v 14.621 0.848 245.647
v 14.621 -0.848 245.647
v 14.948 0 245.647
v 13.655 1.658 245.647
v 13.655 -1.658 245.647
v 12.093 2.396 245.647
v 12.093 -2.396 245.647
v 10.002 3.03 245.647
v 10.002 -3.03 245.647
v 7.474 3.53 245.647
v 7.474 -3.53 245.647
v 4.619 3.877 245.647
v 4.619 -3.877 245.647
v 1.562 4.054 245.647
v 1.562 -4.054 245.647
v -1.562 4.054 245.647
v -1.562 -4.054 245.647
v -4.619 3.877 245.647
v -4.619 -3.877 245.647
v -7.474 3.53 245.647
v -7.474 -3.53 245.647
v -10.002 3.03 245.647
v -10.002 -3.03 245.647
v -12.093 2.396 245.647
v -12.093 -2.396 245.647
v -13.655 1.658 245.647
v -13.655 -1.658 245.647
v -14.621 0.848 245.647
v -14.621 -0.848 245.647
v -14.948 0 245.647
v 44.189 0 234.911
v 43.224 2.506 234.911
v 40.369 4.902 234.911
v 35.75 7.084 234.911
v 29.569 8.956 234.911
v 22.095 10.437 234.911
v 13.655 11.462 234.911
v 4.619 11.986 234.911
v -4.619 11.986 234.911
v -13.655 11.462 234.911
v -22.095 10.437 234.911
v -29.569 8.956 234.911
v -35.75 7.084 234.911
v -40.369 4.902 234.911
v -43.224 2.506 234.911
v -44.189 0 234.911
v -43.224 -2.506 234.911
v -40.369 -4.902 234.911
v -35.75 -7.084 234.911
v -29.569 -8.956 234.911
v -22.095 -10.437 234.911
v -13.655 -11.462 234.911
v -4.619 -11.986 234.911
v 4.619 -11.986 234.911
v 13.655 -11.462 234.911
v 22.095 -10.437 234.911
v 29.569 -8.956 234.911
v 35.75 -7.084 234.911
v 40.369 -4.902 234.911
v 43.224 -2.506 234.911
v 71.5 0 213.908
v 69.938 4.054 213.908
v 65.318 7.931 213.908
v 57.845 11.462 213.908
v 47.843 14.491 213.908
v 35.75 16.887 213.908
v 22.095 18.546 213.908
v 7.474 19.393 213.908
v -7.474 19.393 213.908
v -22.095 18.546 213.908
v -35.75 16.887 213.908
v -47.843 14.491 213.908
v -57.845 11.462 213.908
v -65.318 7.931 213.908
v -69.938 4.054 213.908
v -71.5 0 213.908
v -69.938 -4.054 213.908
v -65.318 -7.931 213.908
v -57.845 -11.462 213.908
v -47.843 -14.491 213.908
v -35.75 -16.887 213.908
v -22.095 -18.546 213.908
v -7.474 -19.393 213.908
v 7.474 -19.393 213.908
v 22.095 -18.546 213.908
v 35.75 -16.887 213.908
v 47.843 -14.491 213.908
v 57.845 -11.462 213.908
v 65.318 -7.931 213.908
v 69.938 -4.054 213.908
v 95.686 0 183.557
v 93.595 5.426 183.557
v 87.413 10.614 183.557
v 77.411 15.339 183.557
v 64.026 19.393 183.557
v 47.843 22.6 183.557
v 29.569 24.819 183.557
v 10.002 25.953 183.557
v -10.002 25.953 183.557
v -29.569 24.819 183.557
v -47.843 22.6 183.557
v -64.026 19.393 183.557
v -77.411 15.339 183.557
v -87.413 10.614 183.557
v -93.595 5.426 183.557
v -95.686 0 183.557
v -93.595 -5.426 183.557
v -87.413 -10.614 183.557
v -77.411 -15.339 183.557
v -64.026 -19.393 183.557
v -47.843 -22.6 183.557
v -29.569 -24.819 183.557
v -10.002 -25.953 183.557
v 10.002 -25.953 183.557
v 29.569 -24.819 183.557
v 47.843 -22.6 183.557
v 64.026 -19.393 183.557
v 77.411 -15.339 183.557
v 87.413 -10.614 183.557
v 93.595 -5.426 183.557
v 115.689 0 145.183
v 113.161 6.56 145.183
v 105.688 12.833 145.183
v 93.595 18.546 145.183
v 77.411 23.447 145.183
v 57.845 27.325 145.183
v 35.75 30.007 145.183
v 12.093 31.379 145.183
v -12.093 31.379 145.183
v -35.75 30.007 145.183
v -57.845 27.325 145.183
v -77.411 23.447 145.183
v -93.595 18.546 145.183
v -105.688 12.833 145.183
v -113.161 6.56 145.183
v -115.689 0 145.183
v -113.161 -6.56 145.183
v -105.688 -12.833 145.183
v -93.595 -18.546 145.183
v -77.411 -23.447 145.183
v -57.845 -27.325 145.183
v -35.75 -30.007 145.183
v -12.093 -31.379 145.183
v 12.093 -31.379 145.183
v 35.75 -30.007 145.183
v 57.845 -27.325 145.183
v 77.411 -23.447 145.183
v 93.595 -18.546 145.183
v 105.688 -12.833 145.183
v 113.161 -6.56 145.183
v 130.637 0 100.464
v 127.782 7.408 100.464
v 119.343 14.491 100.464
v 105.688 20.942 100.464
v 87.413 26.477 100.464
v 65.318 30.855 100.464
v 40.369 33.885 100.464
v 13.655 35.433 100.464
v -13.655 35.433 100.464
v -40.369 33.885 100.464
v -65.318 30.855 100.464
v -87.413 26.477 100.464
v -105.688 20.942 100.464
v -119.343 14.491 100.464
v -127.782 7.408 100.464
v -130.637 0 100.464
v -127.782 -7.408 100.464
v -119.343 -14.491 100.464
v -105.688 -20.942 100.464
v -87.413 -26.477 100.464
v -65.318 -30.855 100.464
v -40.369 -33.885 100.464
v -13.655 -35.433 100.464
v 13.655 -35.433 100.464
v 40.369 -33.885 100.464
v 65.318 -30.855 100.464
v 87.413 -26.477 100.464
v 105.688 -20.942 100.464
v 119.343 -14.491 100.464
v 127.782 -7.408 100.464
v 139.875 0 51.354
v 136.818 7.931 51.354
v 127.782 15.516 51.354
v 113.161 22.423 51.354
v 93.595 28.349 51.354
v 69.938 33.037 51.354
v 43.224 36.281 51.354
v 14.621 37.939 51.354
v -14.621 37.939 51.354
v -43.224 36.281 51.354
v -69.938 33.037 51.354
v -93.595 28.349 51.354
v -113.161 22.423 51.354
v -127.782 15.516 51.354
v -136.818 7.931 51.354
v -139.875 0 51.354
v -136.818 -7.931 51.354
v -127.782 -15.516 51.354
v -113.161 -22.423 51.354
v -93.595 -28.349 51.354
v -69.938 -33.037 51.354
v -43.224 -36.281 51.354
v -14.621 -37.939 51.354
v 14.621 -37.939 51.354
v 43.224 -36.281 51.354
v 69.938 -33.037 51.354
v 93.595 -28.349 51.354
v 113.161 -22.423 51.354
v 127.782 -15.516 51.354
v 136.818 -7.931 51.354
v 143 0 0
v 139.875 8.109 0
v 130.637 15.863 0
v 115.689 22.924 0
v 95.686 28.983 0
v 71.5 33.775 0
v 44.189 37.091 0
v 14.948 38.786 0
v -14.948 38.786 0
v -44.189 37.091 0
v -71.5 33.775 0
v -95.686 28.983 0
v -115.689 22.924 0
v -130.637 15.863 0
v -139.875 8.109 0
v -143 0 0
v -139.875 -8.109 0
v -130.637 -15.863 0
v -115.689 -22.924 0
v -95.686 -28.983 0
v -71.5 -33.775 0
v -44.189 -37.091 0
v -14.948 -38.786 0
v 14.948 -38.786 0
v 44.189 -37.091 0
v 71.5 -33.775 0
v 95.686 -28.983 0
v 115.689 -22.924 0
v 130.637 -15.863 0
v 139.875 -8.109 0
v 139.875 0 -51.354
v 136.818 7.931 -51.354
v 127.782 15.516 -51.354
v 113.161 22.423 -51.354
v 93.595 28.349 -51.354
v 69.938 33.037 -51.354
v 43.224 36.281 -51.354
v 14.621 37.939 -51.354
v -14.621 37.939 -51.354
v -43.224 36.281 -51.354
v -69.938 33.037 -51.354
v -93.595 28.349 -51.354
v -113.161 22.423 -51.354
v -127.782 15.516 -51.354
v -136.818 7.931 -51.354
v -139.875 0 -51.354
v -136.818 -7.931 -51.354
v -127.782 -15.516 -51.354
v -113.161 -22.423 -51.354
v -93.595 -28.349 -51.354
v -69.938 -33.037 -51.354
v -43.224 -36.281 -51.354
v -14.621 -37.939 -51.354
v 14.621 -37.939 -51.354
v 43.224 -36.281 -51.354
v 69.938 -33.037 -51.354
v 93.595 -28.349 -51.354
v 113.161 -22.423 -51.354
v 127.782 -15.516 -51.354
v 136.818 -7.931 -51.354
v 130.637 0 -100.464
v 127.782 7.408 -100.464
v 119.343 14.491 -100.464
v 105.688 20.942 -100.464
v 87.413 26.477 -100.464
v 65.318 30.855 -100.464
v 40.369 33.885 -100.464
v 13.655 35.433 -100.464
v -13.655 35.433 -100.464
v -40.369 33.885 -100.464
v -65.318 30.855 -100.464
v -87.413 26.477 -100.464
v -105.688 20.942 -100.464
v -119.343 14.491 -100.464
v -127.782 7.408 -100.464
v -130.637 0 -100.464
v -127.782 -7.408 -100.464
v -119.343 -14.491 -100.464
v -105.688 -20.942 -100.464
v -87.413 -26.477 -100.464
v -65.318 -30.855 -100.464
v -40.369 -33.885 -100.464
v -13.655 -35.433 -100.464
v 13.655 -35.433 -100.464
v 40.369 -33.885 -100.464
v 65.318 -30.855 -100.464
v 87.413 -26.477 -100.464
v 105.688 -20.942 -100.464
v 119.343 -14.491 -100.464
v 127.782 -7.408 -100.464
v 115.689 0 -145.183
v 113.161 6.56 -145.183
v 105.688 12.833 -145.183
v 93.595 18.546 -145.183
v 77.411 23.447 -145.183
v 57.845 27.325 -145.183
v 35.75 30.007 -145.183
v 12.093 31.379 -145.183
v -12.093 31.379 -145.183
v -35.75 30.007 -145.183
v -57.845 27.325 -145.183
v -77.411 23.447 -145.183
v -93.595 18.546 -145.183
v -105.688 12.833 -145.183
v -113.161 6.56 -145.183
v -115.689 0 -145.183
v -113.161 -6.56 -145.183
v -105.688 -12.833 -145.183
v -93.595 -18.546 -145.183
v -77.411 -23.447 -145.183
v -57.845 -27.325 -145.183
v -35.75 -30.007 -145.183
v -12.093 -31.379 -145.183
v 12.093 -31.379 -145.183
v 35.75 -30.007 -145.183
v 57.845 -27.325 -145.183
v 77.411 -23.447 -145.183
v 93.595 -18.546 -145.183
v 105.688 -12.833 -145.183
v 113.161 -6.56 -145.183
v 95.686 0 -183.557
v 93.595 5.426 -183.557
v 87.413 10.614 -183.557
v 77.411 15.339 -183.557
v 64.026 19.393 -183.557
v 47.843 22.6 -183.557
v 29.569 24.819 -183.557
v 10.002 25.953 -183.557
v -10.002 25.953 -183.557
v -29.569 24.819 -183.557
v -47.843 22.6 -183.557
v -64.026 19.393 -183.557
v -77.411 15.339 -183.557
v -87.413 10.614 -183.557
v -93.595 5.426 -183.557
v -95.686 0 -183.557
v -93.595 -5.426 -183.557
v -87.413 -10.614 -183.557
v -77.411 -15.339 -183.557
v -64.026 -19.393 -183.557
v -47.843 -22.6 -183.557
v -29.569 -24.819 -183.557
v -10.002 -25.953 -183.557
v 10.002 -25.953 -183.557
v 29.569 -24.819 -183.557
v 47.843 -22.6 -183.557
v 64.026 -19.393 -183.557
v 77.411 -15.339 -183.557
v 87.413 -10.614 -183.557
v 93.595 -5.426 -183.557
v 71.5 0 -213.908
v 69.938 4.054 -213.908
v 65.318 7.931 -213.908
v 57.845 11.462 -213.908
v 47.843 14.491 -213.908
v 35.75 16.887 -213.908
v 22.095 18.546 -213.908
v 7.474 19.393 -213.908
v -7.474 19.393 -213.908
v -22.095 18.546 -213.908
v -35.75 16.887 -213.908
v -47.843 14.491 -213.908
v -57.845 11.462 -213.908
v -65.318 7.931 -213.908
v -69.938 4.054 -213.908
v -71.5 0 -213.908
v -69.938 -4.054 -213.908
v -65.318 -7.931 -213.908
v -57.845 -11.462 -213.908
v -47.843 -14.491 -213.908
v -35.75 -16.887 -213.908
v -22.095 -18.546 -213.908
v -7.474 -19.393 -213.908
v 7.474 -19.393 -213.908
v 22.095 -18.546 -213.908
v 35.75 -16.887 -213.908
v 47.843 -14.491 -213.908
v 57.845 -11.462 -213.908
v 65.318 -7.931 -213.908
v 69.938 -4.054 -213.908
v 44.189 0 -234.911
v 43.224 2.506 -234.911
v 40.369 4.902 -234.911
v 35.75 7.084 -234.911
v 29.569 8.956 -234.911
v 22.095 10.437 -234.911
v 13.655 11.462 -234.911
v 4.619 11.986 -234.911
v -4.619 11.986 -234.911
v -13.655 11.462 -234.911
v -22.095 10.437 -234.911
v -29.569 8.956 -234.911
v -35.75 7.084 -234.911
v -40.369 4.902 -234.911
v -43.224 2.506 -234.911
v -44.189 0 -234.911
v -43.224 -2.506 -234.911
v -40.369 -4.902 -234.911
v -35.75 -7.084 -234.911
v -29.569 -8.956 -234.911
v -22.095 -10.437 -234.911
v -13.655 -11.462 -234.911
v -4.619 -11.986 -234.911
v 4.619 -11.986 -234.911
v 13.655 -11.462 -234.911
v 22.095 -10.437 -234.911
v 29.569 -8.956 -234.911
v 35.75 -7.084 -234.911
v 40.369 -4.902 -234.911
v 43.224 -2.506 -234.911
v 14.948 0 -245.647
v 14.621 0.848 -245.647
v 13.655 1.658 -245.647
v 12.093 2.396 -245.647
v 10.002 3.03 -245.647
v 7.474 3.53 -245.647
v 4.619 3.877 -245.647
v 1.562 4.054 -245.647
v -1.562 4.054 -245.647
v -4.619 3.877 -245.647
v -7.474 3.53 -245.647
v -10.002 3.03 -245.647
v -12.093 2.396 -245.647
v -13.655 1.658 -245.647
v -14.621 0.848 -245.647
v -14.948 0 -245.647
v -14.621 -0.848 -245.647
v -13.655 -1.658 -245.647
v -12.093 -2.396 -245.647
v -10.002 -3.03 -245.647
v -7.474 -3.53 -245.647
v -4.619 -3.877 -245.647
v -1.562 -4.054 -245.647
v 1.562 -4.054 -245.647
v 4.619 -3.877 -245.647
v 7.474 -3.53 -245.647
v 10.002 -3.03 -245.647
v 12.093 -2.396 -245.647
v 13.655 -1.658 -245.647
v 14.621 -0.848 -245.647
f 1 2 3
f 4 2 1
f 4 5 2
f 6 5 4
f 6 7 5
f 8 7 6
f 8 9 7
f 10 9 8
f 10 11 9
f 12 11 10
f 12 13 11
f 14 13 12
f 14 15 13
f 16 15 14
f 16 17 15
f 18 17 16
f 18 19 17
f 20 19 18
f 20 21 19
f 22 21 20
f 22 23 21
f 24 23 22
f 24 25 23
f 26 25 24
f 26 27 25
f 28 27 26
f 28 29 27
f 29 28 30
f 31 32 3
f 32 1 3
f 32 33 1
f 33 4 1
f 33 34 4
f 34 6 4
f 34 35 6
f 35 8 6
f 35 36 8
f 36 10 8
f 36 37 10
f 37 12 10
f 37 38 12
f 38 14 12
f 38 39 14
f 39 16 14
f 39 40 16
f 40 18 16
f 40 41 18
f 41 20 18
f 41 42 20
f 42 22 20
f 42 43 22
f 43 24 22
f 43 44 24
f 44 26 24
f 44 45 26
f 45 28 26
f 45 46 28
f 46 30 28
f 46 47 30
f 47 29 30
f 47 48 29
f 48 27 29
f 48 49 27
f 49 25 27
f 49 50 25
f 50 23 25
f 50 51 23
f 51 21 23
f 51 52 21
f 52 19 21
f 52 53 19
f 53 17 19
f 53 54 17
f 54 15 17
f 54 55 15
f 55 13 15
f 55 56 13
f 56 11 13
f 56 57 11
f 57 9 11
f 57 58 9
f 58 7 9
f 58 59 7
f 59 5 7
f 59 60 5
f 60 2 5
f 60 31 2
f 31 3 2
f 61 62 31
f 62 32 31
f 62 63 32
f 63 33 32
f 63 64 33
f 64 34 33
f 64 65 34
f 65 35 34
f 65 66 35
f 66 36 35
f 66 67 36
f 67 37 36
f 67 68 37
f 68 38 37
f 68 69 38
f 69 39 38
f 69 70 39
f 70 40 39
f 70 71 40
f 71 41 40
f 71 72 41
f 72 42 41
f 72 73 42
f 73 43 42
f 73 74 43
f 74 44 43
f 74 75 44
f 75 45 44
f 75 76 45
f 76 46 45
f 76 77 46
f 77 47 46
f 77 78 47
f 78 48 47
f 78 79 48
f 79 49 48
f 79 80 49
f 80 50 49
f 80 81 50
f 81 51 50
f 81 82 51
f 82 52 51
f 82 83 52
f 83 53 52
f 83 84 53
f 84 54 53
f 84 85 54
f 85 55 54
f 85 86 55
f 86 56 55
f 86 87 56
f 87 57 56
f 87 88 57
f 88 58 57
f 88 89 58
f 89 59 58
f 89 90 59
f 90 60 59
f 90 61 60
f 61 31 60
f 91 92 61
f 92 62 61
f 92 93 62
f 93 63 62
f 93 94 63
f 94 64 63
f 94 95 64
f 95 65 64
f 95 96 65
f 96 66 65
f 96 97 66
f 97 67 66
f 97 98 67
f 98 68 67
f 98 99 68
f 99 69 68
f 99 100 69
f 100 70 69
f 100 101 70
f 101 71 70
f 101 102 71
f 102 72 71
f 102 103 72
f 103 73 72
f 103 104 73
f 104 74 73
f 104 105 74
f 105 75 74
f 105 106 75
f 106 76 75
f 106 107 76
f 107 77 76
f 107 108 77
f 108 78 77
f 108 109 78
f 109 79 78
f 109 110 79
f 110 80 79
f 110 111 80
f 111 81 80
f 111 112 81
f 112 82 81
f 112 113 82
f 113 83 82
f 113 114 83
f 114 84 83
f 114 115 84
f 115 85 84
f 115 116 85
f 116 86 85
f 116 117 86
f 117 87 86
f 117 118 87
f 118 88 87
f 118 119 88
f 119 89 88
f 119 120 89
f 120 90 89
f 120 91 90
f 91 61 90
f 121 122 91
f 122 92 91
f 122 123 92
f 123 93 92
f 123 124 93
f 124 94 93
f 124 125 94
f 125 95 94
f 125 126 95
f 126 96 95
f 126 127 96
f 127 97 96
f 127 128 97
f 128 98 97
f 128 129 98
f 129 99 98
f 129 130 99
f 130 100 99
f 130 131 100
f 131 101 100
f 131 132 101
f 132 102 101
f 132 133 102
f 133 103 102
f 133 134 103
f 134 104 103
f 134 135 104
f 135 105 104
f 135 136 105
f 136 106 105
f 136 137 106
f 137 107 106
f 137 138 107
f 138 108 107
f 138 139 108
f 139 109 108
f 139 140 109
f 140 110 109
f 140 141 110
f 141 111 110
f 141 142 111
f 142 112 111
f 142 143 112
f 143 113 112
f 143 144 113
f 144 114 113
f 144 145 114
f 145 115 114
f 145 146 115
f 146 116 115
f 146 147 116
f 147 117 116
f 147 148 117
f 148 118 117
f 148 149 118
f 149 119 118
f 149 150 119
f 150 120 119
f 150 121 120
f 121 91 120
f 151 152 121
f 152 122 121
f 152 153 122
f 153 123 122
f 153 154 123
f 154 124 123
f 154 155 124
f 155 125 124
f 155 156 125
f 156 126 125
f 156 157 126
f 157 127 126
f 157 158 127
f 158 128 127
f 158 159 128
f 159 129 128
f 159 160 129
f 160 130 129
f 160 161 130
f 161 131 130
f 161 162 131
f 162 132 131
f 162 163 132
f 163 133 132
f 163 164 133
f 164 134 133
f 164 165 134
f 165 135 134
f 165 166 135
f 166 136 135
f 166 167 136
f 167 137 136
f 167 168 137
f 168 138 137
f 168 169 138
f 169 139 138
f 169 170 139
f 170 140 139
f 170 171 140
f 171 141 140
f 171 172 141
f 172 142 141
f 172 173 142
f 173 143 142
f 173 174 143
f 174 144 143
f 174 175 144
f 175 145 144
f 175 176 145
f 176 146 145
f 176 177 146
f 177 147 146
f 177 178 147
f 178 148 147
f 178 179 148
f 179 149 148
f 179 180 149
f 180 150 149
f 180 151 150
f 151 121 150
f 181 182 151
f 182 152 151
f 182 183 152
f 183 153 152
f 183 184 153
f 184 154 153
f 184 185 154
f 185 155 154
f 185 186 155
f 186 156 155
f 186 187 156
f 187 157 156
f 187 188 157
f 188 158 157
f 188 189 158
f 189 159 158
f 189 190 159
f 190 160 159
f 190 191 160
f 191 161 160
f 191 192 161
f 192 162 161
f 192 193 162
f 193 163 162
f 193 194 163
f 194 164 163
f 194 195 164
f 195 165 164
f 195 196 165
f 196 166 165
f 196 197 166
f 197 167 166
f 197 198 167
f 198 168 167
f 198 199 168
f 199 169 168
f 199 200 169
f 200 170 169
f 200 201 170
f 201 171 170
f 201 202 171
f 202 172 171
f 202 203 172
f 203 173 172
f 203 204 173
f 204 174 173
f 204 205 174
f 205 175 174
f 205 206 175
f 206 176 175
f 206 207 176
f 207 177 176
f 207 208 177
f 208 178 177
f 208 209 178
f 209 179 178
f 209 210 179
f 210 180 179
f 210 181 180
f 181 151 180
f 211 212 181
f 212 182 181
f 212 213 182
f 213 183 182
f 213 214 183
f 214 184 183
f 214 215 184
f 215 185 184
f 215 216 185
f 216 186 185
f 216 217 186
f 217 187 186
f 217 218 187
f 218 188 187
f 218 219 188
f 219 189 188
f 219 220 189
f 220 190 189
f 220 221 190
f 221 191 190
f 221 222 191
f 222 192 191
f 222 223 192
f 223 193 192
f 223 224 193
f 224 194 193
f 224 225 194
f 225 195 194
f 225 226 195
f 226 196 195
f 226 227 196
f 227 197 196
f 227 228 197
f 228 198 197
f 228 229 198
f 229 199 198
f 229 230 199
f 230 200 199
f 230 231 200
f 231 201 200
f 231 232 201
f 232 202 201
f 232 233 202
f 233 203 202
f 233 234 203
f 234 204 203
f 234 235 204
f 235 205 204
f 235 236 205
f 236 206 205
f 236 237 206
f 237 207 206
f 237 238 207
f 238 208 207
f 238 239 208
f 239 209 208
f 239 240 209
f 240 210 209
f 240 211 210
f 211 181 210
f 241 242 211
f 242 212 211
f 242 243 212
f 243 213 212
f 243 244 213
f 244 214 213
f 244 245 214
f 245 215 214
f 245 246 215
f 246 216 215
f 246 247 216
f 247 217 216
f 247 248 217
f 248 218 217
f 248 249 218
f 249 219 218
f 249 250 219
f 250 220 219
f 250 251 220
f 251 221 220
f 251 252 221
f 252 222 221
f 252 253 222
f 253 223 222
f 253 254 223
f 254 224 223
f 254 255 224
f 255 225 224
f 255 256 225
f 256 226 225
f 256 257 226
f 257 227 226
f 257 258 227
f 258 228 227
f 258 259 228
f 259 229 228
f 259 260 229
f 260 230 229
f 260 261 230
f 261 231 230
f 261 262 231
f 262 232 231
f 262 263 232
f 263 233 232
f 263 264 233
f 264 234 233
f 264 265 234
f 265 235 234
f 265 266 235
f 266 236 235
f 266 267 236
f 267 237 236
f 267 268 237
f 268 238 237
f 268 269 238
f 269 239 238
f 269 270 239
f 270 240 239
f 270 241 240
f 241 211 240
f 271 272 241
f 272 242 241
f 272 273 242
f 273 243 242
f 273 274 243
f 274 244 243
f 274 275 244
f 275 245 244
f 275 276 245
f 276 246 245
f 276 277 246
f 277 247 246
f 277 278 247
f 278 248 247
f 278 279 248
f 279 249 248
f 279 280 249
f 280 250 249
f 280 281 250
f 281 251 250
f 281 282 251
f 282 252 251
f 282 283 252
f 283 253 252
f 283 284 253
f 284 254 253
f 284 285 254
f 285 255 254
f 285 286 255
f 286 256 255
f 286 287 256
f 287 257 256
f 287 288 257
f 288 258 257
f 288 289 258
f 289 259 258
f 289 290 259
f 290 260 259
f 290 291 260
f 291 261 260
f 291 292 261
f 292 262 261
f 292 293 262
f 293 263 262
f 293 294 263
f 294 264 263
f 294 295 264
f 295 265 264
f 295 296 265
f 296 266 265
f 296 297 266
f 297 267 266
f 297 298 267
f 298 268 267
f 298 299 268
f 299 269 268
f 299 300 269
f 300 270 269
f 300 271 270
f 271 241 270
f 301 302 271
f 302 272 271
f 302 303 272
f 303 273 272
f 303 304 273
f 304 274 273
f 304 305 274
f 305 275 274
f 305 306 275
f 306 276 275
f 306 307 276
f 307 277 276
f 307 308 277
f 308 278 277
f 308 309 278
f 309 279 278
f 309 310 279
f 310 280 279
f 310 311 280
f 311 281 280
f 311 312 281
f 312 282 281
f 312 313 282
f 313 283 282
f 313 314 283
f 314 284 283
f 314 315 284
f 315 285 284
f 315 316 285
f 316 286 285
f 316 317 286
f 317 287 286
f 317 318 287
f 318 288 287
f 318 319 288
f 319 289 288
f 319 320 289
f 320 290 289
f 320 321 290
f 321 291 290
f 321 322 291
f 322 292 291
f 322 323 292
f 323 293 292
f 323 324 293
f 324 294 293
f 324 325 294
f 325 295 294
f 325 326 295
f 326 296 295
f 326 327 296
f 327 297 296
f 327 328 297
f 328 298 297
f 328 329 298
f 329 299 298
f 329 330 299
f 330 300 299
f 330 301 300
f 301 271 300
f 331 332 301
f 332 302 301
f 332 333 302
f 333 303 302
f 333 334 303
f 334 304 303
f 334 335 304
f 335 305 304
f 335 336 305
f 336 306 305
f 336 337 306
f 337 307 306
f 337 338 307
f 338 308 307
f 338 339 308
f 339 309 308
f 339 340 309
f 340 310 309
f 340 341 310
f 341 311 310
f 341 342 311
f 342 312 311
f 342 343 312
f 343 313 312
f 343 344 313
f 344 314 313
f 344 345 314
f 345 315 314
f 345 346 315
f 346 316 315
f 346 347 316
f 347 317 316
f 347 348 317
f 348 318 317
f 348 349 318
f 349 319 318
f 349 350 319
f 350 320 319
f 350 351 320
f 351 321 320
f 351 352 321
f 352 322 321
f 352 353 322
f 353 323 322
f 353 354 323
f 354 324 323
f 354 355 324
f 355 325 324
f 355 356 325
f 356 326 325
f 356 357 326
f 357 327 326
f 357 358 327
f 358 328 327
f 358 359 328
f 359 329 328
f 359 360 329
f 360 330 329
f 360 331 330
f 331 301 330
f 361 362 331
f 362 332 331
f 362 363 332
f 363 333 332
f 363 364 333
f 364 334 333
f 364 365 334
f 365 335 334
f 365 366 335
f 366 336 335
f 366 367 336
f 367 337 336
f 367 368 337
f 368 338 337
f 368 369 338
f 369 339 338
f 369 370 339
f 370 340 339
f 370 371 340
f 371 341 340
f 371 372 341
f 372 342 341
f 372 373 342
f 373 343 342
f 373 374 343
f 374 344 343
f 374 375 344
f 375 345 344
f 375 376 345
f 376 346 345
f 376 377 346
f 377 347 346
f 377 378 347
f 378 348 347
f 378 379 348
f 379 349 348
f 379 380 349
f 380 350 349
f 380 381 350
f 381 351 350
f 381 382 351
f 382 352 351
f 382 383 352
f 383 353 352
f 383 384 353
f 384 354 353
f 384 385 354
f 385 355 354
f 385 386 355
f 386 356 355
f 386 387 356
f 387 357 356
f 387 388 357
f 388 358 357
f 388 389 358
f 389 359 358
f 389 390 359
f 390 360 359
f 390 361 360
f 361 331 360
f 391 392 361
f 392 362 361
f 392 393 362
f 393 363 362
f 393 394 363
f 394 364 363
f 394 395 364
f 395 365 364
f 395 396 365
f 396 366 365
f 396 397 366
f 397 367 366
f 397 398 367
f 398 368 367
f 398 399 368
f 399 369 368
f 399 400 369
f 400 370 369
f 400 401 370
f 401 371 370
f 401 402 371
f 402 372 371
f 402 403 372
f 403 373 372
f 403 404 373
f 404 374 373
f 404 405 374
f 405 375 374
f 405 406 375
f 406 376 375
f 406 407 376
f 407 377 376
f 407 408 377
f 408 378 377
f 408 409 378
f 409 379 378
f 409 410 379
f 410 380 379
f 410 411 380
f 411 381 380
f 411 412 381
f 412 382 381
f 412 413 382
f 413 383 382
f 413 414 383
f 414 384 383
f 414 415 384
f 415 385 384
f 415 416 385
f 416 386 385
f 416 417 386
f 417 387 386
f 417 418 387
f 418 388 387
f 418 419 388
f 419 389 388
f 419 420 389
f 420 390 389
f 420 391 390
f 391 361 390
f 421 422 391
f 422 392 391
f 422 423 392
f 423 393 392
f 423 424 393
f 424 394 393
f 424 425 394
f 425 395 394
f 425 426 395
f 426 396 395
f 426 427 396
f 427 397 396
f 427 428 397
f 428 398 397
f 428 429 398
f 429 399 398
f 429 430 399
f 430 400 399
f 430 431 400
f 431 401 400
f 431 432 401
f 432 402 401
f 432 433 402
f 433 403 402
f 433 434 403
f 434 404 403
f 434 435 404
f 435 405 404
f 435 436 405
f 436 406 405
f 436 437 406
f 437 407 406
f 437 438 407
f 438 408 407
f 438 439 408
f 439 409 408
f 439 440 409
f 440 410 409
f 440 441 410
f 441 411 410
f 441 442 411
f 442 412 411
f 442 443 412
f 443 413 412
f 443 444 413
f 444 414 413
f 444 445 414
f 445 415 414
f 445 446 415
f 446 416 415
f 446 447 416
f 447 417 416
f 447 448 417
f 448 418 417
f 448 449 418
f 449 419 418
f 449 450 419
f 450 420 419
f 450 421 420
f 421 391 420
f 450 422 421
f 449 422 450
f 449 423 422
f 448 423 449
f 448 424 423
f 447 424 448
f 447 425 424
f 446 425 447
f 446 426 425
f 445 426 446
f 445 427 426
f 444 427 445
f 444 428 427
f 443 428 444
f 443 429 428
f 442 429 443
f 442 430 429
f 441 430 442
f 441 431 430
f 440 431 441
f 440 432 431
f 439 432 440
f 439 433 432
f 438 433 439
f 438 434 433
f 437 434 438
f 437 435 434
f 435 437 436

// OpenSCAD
// Generated by SolidPython 1.0.1 on 2020-07-29 00:46:49


scale(v = [11, 3, 19]) {
	sphere(r = 13);
}
/***********************************************
*********      SolidPython code:      **********
************************************************
 
# import packages: SolidPython
from solid import *
from solid.utils import *
from itertools import chain, combinations, permutations


class Resize:

    def __init__(self, scad_file):
        self.scad_file = scad_file
        #self.scad_file = import_scad(scad_file)
        # cone/cylinder param:
        self.r1 = 0
        self.r2 = 0
        self.h = 0
        # rectangular prism param:
        self.w = 0
        self.l = 0
        # ellipse param:
        self.r = 0

    # import OpenScad code (file name corresponds to shape)


    # classify shape + parameters
    def assign(self, param1, param2, param3):
        if self.scad_file == 'cone.scad':
            self.r1 = param1
            self.r2 = param2
            self.h = param3
        elif self.scad_file == 'cylinder.scad':
            self.r1 = param1
            self.r2 = param2
            self.h = param3
        elif self.scad_file == 'rectangularPrism.scad':
            self.h = param1
            self.l = param2
            self.w = param3
        else:
            self.r = param1
            self.h = param2

    # resize parameters
    def iterate(self):
        x = range(3, 20, 2)
        i = 1
        if self.scad_file == 'cone.scad':
            tempList = list(permutations(x, 2))
            for temp in tempList:
                param1 = temp[0]
                param2 = temp[1]
                filepath = 'produced_scad_files/' + 'cone' + str(param1) + '_' + str(param2) + '_' + '.scad'
                scad_render_to_file(cylinder(h=param1, r1=param2, r2=0), filepath)

        elif self.scad_file == 'cylinder.scad':
            tempList = list(permutations(x, 3))
            for temp in tempList:
                param1 = temp[0]
                param2 = temp[1]
                filepath = 'produced_scad_files/' + 'cylinder' + str(param1) + '_' + str(param2) + '_' + '.scad'
                scad_render_to_file(cylinder(h=param1, r1=param2, r2=param2), filepath)

        elif self.scad_file == 'rectangularPrism.scad':
            tempList = list(permutations(x, 3))
            for temp in tempList:
                param1 = temp[0]
                param2 = temp[1]
                param3 = temp[2]
                filepath = 'produced_scad_files/' + 'rectangularPrism' + str(param1) + '_' + str(param2) + '_' + str(
                    param3) + '.scad'
                scad_render_to_file(cube(size=(param1, param2, param3)), filepath)

        elif self.scad_file == 'ellipse.scad':
            tempList = list(permutations(x, 4))
            for temp in tempList:
                param1 = temp[0]
                param2 = temp[1]
                param3 = temp[2]
                param4 = temp[3]
                filepath = 'produced_scad_files/' + 'ellipse' + str(param1) + '_' + str(param2) + '_' + str(param3) + '_' + str(param4) + '.scad'
                scad_render_to_file(scale([param1, param2, param3])(sphere(r=param4)), filepath)

    def render_to_scadfile(self):
        scad_render_to_file(scad, 'example.scad') 
 
************************************************/
